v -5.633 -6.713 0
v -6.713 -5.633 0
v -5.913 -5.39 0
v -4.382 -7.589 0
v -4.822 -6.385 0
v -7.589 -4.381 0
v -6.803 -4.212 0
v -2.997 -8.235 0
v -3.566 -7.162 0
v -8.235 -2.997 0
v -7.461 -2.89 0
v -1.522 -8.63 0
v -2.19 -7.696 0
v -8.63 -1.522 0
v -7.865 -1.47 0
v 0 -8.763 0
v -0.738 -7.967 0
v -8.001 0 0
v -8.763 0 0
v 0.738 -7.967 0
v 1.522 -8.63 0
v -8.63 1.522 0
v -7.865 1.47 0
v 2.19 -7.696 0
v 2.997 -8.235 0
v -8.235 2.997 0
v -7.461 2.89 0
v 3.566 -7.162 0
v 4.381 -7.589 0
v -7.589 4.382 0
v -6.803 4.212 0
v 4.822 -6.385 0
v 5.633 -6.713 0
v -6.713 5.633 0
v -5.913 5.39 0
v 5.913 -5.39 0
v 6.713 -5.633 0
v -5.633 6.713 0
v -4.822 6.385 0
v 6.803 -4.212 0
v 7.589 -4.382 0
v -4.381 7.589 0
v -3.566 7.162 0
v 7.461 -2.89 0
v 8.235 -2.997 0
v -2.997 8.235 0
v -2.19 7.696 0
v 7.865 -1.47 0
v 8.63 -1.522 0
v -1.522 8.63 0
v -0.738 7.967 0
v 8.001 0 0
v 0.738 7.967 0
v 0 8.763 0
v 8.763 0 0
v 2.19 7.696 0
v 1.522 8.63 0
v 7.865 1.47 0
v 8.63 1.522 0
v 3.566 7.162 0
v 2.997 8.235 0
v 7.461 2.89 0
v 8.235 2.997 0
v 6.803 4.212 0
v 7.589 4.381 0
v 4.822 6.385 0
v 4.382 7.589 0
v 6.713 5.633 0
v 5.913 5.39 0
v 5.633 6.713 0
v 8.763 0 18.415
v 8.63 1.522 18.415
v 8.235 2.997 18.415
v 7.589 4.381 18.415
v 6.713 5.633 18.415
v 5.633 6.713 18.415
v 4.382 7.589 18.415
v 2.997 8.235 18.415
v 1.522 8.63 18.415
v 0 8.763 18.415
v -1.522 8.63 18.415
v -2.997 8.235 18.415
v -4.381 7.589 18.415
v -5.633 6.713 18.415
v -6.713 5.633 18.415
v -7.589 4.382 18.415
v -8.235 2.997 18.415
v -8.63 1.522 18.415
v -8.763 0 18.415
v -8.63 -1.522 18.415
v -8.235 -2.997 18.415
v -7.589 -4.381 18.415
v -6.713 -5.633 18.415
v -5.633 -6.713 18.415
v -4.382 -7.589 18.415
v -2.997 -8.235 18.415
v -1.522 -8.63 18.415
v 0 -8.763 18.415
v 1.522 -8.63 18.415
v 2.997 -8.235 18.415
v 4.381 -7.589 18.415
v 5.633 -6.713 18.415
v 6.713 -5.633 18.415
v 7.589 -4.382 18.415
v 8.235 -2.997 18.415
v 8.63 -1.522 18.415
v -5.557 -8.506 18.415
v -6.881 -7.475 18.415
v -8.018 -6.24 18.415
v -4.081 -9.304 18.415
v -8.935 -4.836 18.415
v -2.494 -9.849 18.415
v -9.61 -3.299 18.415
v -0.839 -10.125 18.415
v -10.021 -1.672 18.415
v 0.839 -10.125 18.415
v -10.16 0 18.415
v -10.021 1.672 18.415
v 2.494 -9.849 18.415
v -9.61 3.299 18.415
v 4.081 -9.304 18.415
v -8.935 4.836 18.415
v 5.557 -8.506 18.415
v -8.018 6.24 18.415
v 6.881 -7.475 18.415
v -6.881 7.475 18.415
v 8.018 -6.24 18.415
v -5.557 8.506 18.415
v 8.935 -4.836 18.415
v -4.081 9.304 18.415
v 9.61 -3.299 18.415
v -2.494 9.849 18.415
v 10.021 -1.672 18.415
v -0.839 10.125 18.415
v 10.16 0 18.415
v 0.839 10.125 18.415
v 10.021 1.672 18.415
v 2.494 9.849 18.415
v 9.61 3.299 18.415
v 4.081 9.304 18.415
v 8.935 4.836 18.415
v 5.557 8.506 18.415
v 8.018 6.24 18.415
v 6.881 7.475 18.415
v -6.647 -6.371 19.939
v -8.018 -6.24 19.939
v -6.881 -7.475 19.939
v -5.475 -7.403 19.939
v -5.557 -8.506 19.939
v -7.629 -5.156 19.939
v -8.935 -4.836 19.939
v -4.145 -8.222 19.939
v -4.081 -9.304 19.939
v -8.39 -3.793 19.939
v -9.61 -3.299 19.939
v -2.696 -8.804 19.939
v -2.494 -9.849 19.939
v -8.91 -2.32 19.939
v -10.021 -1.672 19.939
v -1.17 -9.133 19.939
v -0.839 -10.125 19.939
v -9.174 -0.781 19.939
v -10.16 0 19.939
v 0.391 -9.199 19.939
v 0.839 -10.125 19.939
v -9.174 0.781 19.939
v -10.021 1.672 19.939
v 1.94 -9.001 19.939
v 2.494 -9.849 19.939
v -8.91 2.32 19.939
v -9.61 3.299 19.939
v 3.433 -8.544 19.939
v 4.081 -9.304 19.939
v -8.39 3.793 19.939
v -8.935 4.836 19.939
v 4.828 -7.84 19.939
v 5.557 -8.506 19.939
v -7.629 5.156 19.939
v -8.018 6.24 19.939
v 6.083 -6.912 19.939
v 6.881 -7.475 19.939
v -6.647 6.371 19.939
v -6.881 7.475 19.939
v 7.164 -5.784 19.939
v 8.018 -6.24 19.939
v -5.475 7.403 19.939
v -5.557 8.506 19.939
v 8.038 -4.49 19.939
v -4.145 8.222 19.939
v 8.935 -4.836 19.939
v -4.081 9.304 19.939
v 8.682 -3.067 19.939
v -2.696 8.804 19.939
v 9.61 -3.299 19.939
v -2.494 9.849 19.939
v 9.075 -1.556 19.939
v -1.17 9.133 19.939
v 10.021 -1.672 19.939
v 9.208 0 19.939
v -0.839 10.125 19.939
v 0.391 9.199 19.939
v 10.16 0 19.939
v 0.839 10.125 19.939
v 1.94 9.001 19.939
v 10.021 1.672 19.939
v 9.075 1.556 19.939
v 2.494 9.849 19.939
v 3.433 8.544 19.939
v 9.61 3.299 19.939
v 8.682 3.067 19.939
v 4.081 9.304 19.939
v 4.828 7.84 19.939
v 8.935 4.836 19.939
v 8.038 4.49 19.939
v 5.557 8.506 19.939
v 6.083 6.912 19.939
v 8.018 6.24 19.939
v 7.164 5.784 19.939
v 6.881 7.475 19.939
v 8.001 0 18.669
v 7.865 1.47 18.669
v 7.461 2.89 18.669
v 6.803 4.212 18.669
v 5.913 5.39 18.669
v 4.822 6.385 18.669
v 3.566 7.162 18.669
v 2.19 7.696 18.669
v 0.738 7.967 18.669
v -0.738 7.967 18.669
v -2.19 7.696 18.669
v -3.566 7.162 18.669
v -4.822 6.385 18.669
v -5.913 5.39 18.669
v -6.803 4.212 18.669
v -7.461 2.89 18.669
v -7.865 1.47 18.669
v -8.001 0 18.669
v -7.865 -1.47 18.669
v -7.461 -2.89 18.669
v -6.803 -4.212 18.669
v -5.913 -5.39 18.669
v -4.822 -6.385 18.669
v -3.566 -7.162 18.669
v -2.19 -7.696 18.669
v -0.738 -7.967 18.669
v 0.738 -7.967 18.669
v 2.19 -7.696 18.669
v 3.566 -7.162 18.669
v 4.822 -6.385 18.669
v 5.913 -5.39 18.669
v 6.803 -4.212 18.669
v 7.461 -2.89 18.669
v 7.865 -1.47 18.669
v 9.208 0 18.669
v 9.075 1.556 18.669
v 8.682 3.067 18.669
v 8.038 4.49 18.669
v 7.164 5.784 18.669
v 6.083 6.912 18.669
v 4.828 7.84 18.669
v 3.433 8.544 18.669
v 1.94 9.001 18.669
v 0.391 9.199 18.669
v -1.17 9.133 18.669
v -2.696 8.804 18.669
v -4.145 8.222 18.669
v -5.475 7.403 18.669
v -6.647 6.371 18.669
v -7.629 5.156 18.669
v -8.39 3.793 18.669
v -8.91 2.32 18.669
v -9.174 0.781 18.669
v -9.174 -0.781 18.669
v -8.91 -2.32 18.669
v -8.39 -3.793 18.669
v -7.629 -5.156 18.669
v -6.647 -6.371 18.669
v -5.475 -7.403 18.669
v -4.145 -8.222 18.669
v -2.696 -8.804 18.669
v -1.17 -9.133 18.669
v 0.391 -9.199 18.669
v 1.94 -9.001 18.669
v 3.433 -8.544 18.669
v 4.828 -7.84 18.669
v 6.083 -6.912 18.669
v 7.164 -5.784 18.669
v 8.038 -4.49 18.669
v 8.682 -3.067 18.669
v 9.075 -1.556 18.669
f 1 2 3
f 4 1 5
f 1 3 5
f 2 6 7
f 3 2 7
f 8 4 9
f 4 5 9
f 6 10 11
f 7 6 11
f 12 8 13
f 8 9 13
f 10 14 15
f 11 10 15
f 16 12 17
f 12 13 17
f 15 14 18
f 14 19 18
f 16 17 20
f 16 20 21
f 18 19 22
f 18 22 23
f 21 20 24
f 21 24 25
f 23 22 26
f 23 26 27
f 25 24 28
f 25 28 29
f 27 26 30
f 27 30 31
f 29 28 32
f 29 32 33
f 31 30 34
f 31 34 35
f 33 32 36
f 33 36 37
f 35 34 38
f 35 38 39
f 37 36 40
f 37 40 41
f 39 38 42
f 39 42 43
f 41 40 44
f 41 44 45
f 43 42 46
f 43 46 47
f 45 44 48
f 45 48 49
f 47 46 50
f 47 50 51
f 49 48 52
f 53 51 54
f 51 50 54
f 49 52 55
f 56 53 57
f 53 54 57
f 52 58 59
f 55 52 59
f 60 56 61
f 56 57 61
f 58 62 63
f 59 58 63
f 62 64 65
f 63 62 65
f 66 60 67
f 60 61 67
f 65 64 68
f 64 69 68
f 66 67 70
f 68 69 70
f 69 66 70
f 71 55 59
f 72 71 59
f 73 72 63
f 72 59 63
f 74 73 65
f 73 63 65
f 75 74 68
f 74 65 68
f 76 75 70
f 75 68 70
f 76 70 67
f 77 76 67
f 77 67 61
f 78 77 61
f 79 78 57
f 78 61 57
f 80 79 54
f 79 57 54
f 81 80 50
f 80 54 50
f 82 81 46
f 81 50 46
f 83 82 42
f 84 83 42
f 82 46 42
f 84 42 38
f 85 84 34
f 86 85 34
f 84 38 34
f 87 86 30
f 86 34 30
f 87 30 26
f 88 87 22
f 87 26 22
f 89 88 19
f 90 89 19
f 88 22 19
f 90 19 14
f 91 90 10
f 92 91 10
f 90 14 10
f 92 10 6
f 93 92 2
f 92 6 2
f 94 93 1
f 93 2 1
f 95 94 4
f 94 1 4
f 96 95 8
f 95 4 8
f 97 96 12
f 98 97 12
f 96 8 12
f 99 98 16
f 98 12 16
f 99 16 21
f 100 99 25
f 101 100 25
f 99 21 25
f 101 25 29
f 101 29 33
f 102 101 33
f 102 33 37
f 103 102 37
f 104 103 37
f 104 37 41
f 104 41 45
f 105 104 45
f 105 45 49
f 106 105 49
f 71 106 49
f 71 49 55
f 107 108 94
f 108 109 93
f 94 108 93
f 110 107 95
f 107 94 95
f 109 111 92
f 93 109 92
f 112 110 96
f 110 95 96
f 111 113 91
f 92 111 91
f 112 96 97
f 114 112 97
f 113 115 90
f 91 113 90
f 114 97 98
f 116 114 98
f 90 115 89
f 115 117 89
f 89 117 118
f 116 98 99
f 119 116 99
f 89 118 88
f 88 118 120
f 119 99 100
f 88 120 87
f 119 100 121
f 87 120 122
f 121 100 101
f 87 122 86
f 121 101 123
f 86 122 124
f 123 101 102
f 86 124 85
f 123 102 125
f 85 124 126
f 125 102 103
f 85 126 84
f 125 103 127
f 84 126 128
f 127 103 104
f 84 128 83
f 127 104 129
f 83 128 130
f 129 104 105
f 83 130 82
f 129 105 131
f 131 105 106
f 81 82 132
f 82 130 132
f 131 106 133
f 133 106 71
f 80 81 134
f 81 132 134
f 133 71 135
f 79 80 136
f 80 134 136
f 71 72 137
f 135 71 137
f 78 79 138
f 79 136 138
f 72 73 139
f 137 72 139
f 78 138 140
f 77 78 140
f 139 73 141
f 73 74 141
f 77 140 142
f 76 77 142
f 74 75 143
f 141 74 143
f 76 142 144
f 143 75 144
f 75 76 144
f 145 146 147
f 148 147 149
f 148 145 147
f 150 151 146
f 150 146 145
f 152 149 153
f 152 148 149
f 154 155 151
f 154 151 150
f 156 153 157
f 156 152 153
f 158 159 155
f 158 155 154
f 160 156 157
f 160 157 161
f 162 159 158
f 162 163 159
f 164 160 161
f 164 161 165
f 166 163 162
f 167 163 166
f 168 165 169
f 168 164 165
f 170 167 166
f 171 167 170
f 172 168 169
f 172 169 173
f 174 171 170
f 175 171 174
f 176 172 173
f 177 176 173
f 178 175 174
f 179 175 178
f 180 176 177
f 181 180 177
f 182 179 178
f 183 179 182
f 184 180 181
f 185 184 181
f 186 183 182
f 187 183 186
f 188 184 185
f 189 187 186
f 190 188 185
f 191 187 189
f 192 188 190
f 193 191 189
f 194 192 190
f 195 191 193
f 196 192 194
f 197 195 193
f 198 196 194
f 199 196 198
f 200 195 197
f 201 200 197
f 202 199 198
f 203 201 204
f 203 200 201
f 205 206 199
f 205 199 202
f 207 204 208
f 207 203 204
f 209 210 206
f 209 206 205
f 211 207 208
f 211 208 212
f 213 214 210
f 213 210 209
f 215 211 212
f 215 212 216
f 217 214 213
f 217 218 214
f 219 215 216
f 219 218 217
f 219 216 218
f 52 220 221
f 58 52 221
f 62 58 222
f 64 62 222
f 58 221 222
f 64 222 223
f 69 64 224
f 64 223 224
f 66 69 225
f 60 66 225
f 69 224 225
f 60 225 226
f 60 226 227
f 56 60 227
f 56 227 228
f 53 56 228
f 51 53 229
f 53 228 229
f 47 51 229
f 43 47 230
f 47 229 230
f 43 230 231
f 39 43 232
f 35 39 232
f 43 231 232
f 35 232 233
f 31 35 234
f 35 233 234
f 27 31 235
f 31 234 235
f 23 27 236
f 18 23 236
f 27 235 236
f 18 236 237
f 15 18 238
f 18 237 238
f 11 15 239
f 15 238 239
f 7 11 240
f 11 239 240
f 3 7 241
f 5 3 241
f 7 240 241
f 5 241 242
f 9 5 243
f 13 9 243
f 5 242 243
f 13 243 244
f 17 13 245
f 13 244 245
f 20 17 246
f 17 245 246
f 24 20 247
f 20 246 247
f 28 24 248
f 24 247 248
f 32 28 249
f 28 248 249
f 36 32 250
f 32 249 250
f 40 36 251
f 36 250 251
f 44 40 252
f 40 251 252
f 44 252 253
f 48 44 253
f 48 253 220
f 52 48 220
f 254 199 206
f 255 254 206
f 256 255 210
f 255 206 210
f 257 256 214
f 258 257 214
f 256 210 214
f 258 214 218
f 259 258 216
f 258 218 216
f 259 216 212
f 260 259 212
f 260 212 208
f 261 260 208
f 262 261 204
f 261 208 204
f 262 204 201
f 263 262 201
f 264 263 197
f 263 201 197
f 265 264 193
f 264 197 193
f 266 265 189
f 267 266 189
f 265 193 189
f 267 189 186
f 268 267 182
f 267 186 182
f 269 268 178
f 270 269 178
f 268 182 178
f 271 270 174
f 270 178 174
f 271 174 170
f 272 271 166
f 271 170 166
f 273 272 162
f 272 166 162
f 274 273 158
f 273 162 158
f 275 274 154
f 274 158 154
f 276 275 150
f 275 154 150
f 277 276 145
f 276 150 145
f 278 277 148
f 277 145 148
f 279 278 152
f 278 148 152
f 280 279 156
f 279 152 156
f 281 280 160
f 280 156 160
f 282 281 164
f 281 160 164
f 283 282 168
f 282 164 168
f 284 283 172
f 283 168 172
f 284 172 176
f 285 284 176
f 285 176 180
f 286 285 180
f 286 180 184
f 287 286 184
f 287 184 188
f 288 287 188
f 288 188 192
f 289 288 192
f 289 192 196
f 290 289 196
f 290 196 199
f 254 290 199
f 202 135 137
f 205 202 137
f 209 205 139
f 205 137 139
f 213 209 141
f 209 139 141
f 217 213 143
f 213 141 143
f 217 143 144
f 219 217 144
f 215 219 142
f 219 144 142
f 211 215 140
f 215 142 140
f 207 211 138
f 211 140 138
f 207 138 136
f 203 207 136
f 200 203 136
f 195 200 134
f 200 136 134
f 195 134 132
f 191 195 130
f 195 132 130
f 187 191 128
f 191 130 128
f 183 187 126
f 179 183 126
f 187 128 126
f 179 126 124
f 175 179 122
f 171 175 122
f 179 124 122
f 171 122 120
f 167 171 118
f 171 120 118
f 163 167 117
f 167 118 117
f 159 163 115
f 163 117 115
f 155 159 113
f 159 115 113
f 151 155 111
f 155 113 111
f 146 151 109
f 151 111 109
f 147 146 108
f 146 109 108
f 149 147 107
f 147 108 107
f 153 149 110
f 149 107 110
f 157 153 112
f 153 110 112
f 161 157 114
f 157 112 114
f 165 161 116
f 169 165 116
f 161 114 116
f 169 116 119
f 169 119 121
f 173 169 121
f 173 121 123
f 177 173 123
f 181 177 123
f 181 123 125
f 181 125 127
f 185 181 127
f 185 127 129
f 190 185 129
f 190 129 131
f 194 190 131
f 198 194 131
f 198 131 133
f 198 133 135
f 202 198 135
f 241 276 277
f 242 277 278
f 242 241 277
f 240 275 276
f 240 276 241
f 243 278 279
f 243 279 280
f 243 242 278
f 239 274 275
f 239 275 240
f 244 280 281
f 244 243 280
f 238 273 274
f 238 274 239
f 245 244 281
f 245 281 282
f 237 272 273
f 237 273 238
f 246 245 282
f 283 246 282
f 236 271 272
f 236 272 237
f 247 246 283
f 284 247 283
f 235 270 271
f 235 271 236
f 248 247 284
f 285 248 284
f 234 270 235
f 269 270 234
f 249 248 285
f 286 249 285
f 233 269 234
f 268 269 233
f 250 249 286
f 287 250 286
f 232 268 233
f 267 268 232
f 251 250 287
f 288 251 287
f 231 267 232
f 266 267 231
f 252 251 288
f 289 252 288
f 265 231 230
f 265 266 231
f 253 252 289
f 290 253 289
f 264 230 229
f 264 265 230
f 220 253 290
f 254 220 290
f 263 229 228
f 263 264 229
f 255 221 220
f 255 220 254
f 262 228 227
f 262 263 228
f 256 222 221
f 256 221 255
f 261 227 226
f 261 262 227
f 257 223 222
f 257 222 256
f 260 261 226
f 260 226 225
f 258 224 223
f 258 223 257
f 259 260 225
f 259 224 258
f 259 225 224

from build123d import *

# Parameters (mm, degrees)
F0_R     = 8.763
F1_DEPTH = 18.415
F3_R     = 10.16
F4_DEPTH = 1.524
F2_R     = 8.001
F5_DEPTH = 27.9654
F6_R     = 9.2075
F7_DEPTH = 1.27


with BuildPart() as f1:
    # F0 (on Top) → F1 (new body)
    with BuildSketch(Plane.XY):
        Circle(F0_R)
    extrude(amount=F1_DEPTH)

    # F3 (on face) → F4 (join)
    with BuildSketch(Plane.XY.offset(18.415)):
        Circle(F3_R)
    extrude(amount=F4_DEPTH)

    # F2 (on face) → F5 (cut, symmetric)
    with BuildSketch(Plane.XY.offset(18.415)):
        Circle(F2_R)
    extrude(amount=F5_DEPTH, both=True, mode=Mode.SUBTRACT)

    # F6 (on face) → F7 (cut)
    with BuildSketch(Plane.XY.offset(19.939)):
        Circle(F6_R)
    extrude(amount=-F7_DEPTH, mode=Mode.SUBTRACT)


solid = f1.part
